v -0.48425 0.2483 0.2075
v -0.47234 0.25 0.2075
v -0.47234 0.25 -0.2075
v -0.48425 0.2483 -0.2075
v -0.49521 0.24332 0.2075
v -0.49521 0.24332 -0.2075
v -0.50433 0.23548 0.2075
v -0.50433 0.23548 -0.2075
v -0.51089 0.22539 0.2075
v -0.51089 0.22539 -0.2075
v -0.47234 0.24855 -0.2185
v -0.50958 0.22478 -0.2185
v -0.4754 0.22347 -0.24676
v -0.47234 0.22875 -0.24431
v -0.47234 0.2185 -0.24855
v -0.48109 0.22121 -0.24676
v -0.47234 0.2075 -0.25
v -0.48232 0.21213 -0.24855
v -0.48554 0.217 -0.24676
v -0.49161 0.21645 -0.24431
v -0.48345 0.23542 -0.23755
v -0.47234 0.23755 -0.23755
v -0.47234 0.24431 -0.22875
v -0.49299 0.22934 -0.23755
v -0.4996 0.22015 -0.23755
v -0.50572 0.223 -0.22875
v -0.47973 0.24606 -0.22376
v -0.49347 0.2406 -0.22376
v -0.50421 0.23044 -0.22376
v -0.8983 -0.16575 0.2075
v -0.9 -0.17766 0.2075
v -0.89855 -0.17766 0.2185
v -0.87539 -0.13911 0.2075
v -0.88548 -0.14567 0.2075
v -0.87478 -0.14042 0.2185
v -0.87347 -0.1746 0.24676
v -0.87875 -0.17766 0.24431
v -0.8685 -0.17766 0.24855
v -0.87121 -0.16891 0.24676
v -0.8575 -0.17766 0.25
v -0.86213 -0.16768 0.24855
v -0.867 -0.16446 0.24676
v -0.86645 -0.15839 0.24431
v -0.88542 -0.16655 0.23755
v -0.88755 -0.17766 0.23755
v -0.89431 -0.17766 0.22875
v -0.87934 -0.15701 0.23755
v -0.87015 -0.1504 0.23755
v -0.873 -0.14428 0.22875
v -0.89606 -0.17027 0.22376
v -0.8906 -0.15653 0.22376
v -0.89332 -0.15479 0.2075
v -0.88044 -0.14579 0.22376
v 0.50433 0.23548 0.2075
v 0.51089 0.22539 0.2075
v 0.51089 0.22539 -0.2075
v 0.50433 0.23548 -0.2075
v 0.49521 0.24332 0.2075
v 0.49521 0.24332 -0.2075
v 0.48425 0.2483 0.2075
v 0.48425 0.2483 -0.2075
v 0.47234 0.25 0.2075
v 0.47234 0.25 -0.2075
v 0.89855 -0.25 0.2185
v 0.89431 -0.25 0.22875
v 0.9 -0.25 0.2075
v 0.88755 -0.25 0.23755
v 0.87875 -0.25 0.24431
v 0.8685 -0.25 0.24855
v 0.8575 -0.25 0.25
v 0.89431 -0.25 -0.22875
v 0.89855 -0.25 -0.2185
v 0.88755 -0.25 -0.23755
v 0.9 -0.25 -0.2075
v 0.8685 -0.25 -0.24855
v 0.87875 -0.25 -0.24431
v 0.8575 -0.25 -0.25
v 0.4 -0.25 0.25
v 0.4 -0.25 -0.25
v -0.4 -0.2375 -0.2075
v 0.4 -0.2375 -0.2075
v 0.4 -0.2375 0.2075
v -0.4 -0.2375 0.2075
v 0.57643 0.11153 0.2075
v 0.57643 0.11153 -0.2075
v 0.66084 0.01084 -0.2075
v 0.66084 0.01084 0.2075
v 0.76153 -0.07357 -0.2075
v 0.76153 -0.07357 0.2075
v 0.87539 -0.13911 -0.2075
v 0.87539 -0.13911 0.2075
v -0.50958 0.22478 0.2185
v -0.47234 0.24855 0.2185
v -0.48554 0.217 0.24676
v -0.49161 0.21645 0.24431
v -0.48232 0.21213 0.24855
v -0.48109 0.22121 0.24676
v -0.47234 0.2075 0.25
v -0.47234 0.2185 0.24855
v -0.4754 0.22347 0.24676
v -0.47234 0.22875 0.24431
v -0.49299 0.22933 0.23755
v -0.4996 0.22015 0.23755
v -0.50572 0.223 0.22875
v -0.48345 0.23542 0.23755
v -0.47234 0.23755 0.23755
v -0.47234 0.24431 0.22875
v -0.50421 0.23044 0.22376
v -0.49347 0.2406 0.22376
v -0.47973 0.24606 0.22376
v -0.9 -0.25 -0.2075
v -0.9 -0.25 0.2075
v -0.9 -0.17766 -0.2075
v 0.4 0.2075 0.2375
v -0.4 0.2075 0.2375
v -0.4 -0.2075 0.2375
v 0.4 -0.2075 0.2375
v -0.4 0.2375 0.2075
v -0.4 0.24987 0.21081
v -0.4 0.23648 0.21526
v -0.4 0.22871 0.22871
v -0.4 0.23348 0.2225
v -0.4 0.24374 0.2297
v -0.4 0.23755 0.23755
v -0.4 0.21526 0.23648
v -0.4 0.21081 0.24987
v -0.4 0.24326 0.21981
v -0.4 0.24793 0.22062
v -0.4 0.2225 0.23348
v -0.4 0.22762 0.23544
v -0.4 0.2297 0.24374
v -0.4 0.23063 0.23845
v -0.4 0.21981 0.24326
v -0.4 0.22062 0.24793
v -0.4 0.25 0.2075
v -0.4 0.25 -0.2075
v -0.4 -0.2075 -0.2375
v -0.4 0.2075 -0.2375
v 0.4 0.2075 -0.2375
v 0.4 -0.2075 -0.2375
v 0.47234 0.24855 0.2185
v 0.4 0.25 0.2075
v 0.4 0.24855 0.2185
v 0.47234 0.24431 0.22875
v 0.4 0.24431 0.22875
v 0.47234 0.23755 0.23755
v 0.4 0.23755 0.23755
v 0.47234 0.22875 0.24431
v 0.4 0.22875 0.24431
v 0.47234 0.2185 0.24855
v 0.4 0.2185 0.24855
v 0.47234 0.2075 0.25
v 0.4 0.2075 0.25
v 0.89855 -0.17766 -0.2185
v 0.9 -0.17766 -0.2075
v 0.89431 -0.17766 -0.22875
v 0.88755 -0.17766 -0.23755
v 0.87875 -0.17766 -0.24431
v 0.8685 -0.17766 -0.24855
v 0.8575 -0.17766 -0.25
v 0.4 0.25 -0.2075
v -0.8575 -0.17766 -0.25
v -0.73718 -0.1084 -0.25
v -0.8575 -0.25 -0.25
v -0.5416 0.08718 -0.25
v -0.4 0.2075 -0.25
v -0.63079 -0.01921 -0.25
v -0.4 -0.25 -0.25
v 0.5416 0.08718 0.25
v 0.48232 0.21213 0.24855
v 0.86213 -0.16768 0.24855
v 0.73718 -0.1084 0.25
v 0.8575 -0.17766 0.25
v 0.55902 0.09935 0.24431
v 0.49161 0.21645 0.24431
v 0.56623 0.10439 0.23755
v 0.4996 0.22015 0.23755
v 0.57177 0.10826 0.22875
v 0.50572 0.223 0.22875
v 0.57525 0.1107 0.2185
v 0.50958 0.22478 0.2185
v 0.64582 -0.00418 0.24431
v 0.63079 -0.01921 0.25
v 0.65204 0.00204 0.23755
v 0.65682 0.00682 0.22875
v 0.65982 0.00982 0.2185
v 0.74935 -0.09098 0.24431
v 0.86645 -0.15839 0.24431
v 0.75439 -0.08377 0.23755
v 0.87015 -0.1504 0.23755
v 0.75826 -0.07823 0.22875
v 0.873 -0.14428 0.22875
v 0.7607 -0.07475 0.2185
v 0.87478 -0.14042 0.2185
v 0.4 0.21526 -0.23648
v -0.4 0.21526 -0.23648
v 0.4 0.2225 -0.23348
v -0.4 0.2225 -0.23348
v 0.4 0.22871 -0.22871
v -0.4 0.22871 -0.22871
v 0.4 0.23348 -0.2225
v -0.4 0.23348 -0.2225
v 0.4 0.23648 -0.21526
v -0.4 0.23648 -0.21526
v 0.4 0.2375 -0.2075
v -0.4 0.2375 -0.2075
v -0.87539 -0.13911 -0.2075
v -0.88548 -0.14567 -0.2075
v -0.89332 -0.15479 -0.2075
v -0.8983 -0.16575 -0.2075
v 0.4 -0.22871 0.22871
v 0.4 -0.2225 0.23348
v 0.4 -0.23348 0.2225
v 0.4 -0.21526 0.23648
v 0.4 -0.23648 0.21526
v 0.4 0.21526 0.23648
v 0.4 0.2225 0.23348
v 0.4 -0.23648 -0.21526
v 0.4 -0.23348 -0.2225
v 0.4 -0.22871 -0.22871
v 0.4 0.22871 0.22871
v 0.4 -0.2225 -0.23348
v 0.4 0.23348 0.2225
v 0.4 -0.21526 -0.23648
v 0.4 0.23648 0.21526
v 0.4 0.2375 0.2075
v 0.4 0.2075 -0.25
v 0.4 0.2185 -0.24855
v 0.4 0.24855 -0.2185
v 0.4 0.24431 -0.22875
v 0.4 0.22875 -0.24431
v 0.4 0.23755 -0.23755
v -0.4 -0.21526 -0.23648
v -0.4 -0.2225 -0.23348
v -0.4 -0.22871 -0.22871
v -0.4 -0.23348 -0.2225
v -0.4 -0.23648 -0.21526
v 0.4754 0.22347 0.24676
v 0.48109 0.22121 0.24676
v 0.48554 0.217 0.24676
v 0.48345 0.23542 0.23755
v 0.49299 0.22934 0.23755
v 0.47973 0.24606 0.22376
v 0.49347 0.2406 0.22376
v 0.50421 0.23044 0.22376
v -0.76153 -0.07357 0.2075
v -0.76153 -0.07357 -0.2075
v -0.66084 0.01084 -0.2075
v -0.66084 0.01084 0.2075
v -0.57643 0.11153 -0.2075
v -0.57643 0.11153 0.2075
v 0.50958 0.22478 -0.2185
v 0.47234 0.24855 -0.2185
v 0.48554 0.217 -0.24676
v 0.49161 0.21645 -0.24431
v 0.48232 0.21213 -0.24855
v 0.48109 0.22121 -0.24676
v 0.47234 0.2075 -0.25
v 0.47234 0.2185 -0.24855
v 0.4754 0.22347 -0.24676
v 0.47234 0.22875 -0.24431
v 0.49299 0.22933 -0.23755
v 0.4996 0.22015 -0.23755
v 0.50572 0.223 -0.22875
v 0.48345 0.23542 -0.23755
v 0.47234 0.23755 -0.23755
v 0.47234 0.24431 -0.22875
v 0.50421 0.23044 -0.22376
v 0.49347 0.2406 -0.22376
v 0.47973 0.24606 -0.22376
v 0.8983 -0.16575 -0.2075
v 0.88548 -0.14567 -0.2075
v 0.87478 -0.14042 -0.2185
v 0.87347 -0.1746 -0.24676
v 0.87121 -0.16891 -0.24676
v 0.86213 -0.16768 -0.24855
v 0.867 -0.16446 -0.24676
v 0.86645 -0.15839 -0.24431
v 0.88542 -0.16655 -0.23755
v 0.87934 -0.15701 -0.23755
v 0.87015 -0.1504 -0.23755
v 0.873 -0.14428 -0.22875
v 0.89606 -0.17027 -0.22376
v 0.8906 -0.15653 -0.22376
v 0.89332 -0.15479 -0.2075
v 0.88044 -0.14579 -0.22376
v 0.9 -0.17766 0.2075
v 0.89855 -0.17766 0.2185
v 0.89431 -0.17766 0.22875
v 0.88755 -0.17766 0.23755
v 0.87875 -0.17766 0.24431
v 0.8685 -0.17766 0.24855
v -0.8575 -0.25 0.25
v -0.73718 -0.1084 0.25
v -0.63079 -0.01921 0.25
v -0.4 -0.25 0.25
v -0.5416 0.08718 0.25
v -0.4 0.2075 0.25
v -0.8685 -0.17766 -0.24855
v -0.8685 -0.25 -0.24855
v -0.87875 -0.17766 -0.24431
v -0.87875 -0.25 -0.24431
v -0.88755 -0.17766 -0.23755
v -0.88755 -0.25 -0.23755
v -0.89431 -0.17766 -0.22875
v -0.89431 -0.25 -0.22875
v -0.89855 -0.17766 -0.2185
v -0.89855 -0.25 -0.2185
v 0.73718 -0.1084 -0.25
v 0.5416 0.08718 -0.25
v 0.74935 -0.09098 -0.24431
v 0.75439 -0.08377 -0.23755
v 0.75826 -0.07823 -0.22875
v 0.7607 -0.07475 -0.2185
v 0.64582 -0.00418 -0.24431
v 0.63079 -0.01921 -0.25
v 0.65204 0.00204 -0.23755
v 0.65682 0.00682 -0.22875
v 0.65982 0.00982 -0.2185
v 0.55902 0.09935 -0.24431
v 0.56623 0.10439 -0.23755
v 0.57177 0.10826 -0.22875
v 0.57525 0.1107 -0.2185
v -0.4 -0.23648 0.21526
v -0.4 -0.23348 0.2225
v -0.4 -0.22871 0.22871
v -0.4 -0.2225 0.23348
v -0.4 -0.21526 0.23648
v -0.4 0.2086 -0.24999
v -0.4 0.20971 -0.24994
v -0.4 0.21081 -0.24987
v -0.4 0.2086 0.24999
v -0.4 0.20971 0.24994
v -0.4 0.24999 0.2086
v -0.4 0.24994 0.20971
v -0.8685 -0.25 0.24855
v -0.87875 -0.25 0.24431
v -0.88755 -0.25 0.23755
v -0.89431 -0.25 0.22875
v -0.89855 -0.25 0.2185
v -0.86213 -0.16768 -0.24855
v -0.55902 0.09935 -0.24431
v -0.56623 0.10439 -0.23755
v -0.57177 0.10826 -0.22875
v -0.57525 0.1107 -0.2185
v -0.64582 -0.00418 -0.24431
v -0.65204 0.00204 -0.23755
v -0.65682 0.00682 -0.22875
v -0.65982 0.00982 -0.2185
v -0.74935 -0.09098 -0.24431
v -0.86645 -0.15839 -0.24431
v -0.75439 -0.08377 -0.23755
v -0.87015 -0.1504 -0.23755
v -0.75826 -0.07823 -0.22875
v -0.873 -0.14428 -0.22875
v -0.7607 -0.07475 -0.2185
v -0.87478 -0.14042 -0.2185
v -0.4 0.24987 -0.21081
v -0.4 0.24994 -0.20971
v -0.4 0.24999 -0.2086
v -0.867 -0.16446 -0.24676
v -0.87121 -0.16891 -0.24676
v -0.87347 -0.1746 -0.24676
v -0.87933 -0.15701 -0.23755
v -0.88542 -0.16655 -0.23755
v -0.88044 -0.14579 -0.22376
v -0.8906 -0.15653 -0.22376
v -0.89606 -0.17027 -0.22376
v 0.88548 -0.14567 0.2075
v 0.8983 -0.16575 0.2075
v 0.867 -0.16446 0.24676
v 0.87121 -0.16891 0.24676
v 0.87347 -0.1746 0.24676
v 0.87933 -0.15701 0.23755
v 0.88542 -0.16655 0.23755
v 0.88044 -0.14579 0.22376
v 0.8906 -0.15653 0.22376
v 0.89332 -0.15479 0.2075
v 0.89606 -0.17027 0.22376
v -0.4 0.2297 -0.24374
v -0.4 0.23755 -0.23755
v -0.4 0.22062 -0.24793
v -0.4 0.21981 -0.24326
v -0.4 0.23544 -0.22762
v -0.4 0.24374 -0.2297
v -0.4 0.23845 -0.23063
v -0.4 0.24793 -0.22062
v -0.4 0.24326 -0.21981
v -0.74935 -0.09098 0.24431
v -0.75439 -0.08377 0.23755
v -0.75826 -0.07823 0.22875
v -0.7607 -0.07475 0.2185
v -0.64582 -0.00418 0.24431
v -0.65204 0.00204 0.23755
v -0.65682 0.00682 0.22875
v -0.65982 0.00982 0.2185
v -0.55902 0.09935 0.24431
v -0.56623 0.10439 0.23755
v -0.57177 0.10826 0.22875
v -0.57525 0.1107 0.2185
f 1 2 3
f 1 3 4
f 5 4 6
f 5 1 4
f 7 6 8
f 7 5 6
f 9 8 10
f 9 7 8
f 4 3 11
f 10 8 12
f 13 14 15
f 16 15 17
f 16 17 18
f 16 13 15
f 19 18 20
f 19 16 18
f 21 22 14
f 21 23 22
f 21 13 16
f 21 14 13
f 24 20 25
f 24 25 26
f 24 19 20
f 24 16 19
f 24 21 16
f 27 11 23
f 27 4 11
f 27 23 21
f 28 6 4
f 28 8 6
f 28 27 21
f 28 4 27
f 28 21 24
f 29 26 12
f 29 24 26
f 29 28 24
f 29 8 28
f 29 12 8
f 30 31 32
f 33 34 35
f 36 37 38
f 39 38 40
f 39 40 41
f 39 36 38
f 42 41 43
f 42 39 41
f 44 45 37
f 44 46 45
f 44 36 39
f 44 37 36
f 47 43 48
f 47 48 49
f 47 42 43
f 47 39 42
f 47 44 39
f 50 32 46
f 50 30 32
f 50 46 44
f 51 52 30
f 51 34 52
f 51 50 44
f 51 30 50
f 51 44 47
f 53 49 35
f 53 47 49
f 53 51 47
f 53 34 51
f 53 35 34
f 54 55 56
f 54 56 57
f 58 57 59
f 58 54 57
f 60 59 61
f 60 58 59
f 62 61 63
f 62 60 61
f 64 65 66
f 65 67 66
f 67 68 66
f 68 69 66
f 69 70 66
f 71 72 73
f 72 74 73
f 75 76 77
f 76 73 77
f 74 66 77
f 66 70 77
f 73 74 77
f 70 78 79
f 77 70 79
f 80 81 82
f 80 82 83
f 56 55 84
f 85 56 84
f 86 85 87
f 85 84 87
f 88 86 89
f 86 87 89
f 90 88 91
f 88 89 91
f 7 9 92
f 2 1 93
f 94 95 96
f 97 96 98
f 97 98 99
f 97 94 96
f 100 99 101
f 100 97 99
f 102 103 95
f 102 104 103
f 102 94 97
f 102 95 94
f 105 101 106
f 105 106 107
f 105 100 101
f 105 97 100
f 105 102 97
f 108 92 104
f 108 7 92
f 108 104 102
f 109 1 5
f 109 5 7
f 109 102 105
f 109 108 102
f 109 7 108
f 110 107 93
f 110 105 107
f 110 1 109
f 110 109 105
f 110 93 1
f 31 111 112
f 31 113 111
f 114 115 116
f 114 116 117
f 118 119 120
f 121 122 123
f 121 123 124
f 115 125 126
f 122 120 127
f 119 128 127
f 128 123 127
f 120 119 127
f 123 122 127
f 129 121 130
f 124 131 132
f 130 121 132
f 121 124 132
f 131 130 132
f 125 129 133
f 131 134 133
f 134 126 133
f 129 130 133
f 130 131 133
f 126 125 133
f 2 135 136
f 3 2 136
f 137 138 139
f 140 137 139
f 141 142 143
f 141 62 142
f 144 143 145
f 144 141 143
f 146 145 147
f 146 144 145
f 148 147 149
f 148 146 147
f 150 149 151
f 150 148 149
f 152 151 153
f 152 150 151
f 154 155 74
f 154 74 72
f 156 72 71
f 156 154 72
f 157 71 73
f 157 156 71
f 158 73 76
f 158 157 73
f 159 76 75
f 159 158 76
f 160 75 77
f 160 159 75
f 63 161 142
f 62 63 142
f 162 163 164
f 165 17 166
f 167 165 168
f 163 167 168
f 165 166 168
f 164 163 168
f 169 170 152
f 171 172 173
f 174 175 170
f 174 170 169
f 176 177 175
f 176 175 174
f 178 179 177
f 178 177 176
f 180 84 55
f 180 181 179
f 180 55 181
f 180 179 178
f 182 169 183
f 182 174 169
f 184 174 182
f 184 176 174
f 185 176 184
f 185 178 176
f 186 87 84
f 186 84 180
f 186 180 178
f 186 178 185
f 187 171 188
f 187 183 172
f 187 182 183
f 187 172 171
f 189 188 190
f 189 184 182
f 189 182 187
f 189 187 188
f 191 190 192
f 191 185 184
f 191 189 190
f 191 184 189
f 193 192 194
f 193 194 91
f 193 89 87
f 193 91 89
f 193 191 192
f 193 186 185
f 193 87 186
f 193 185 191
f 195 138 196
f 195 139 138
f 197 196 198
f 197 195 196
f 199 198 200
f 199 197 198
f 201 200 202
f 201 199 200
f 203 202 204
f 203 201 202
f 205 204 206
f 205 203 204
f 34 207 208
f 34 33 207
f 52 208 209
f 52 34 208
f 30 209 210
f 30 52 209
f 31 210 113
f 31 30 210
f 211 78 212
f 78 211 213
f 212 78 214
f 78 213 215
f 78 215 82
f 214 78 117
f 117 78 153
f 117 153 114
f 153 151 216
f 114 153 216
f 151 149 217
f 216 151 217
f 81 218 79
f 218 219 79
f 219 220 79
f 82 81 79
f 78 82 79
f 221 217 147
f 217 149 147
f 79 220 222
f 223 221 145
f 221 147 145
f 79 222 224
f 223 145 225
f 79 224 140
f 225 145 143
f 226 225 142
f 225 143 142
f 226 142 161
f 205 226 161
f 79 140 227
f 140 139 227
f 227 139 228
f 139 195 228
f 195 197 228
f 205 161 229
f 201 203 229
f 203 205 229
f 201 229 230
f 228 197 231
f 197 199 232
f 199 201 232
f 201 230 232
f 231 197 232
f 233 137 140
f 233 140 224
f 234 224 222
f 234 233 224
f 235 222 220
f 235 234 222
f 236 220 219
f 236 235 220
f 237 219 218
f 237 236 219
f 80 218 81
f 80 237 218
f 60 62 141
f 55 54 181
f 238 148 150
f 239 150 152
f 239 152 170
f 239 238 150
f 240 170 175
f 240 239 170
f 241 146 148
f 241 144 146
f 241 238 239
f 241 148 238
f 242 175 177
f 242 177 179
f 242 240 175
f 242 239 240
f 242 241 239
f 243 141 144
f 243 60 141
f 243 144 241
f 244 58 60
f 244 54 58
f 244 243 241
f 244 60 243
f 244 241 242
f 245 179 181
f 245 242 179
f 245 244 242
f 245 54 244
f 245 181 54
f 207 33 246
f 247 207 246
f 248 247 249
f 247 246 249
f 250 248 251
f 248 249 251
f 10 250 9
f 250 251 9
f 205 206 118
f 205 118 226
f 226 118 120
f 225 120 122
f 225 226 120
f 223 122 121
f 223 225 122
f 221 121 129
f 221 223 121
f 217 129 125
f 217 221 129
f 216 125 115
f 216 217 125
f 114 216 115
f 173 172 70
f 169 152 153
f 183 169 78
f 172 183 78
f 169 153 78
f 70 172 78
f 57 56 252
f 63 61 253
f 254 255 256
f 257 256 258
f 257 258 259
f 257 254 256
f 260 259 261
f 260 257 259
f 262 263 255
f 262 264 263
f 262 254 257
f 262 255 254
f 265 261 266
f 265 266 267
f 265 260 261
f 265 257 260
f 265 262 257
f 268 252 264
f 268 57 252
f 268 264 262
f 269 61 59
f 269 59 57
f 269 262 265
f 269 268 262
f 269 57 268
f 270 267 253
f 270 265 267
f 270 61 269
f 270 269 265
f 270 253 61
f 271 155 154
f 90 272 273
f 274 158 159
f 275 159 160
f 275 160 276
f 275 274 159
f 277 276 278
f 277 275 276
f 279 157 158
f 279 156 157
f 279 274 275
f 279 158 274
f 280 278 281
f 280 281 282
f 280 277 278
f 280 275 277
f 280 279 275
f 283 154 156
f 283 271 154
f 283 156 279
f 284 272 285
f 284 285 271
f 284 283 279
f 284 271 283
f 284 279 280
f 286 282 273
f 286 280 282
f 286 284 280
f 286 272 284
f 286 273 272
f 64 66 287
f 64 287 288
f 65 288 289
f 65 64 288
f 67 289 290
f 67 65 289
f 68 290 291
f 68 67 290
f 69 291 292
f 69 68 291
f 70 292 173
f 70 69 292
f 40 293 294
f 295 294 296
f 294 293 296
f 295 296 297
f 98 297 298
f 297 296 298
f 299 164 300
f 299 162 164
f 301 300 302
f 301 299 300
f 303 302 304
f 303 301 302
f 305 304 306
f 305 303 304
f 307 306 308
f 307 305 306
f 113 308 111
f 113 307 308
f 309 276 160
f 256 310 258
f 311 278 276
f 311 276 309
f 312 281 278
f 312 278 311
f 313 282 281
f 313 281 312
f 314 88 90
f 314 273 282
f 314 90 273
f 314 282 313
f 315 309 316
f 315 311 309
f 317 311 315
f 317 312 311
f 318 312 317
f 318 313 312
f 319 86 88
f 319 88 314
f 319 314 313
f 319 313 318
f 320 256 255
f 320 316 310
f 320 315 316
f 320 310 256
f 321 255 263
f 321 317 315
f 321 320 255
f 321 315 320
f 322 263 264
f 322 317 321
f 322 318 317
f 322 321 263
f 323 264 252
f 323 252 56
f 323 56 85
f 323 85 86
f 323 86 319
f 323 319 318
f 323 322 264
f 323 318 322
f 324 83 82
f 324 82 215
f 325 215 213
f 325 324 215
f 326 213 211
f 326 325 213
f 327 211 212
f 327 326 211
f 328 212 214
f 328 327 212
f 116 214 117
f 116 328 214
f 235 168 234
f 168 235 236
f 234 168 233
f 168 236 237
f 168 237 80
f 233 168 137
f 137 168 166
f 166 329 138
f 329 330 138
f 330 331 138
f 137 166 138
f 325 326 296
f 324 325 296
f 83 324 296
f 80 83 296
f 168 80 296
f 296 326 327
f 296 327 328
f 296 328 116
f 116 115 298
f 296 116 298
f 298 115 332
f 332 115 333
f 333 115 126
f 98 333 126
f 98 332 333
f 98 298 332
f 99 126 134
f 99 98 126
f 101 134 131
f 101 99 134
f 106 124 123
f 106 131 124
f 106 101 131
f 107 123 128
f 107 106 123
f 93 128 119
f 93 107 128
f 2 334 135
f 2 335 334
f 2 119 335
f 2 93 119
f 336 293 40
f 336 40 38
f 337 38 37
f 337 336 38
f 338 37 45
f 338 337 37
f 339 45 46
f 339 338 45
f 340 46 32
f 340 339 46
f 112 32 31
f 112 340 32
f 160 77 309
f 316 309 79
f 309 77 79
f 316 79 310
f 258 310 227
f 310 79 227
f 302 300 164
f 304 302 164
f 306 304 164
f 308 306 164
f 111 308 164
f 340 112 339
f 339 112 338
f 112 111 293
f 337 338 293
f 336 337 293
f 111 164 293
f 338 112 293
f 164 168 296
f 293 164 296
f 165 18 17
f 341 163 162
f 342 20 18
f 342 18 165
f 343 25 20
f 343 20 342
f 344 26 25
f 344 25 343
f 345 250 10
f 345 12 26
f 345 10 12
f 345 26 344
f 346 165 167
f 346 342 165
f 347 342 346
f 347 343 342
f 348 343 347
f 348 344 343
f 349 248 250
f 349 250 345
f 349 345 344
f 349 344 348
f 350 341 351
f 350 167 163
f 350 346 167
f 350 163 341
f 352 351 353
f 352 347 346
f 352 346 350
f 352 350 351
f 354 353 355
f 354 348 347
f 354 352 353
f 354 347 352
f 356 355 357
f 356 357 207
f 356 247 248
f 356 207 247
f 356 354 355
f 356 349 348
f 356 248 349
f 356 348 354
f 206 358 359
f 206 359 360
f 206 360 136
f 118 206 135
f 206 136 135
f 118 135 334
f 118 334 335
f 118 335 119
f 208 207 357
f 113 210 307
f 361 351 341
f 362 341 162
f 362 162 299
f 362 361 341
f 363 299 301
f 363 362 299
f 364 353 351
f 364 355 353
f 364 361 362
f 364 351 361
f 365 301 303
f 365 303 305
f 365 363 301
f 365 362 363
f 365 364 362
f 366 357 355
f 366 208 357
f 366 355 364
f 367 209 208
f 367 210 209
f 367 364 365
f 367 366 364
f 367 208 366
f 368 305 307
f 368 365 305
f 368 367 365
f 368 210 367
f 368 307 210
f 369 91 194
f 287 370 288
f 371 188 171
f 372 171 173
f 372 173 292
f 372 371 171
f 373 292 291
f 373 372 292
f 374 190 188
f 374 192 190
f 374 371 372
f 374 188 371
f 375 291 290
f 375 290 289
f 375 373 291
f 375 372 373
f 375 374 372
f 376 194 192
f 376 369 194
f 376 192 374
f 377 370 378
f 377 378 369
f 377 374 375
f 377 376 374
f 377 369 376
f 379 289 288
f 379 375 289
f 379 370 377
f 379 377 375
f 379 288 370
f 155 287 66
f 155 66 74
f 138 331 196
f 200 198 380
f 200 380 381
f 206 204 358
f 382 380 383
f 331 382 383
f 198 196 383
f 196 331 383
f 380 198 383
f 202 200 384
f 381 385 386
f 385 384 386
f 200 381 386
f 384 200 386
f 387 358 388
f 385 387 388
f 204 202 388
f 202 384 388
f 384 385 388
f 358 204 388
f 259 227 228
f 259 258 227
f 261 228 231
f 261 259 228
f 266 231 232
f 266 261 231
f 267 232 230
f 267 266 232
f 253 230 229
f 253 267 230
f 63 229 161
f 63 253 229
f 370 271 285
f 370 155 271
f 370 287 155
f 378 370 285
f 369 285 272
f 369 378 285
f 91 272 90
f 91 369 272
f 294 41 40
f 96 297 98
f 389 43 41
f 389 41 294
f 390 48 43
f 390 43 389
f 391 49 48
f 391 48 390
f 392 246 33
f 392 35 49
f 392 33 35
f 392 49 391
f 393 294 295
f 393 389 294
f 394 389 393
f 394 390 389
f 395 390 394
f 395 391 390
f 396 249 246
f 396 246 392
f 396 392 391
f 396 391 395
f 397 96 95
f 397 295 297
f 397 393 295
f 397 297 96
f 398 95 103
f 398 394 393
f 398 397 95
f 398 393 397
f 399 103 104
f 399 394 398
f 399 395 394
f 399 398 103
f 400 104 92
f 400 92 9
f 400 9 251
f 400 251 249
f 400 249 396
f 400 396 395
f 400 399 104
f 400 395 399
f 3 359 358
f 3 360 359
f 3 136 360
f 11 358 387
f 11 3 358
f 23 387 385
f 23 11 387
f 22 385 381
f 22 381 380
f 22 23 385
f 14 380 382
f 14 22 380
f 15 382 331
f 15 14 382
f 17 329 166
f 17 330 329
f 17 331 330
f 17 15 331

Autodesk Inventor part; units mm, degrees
ref_plane "YZ Plane" through (0, 0, 0) normal (1, 0, 0) x (0, 1, 0)
ref_plane "XZ Plane" through (0, 0, 0) normal (0, 1, 0) x (-1, 0, 0)
ref_plane "XY Plane" through (0, 0, 0) normal (0, 0, 1) x (1, 0, 0)
sketch "Sketch10" plane through (0, 0, 0) normal (0, 0, 1) x (1, 0, 0)
  line L0 (-0.4, 0.2375) -> (0.4, 0.2375)
  line L1 (0.4, 0.2375) -> (0.4, -0.2375)
  line L2 (0.4, -0.2375) -> (-0.4, -0.2375)
  line L3 (-0.4, -0.2375) -> (-0.4, 0.2375)
  point P0 (0, 0)
  point P1 (-0.4, 0)
  point P2 (0, 0.2375)
  dimension "d7" = 0.8
  dimension "d8" = 0.475
extrude "Extrusion4" add sketch "Sketch10" along normal mid plane 0.475
sketch "Sketch11" plane through (0.4, -0.2375, 0.2375) normal (1, 0, 0) x (0, 0, -1)
  line L0 (0, 0.475) -> (0.475, 0.475) construction
  line L1 (0, 0) -> (0, 0.475) construction
  line L2 (0, 0) -> (0.475, 0) construction
  line L3 (0.475, 0.475) -> (0.475, 0) construction
  line L4 (0.4875, 0.4875) -> (-0.0125, 0.4875)
  line L5 (-0.0125, 0.4875) -> (-0.0125, -0.0125)
  line L6 (-0.0125, -0.0125) -> (0.4875, -0.0125)
  line L7 (0.4875, -0.0125) -> (0.4875, 0.4875)
  line L8 (-0.0125, -0.0125) -> (0.4875, -0.0125)
  line L9 (0.4875, -0.0125) -> (0.4875, 0.0875)
  line L10 (0.4875, 0.0875) -> (-0.0125, 0.0875)
  line L11 (-0.0125, 0.0875) -> (-0.0125, -0.0125)
  point P0 (0.2375, 0.2375)
  dimension "d11" = 0.5
  dimension "d14" = 0.1
extrude "Extrusion5" add sketch "Sketch11" along normal blind 0.1
extrude "Extrusion6" add sketch "Sketch11" along normal blind 0.5 contours L7 L6 L5 L10
fillet "Fillet1" radius 0.75 1 edges at (0.5, -0.15, 0)
fillet "Fillet2" radius 0.0425 8 edges at (0.45, 0.25, -0.25) (0.45, 0.25, 0.25) (0.6608, 0.0108, 0.25) (0.6608, 0.0108, -0.25) (0.9, -0.2, -0.25) (0.9, -0.15, 0) (0.9, -0.2, 0.25) (0.5, 0.25, 0)
mirror "Mirror1" about plane through (0, 0, 0) normal (1, 0, 0) of "Extrusion5", "Fillet1", "Fillet2", "Extrusion6"
fillet "Fillet3" radius 0.03 4 edges at (0, 0.2375, -0.2375) (0, 0.2375, 0.2375) (0, -0.2375, -0.2375) (0, -0.2375, 0.2375)
equation "\"d9\" = d8"
properties part number "TDK C1005 Capacitor" material "Laminate, Ivory, Matte"
